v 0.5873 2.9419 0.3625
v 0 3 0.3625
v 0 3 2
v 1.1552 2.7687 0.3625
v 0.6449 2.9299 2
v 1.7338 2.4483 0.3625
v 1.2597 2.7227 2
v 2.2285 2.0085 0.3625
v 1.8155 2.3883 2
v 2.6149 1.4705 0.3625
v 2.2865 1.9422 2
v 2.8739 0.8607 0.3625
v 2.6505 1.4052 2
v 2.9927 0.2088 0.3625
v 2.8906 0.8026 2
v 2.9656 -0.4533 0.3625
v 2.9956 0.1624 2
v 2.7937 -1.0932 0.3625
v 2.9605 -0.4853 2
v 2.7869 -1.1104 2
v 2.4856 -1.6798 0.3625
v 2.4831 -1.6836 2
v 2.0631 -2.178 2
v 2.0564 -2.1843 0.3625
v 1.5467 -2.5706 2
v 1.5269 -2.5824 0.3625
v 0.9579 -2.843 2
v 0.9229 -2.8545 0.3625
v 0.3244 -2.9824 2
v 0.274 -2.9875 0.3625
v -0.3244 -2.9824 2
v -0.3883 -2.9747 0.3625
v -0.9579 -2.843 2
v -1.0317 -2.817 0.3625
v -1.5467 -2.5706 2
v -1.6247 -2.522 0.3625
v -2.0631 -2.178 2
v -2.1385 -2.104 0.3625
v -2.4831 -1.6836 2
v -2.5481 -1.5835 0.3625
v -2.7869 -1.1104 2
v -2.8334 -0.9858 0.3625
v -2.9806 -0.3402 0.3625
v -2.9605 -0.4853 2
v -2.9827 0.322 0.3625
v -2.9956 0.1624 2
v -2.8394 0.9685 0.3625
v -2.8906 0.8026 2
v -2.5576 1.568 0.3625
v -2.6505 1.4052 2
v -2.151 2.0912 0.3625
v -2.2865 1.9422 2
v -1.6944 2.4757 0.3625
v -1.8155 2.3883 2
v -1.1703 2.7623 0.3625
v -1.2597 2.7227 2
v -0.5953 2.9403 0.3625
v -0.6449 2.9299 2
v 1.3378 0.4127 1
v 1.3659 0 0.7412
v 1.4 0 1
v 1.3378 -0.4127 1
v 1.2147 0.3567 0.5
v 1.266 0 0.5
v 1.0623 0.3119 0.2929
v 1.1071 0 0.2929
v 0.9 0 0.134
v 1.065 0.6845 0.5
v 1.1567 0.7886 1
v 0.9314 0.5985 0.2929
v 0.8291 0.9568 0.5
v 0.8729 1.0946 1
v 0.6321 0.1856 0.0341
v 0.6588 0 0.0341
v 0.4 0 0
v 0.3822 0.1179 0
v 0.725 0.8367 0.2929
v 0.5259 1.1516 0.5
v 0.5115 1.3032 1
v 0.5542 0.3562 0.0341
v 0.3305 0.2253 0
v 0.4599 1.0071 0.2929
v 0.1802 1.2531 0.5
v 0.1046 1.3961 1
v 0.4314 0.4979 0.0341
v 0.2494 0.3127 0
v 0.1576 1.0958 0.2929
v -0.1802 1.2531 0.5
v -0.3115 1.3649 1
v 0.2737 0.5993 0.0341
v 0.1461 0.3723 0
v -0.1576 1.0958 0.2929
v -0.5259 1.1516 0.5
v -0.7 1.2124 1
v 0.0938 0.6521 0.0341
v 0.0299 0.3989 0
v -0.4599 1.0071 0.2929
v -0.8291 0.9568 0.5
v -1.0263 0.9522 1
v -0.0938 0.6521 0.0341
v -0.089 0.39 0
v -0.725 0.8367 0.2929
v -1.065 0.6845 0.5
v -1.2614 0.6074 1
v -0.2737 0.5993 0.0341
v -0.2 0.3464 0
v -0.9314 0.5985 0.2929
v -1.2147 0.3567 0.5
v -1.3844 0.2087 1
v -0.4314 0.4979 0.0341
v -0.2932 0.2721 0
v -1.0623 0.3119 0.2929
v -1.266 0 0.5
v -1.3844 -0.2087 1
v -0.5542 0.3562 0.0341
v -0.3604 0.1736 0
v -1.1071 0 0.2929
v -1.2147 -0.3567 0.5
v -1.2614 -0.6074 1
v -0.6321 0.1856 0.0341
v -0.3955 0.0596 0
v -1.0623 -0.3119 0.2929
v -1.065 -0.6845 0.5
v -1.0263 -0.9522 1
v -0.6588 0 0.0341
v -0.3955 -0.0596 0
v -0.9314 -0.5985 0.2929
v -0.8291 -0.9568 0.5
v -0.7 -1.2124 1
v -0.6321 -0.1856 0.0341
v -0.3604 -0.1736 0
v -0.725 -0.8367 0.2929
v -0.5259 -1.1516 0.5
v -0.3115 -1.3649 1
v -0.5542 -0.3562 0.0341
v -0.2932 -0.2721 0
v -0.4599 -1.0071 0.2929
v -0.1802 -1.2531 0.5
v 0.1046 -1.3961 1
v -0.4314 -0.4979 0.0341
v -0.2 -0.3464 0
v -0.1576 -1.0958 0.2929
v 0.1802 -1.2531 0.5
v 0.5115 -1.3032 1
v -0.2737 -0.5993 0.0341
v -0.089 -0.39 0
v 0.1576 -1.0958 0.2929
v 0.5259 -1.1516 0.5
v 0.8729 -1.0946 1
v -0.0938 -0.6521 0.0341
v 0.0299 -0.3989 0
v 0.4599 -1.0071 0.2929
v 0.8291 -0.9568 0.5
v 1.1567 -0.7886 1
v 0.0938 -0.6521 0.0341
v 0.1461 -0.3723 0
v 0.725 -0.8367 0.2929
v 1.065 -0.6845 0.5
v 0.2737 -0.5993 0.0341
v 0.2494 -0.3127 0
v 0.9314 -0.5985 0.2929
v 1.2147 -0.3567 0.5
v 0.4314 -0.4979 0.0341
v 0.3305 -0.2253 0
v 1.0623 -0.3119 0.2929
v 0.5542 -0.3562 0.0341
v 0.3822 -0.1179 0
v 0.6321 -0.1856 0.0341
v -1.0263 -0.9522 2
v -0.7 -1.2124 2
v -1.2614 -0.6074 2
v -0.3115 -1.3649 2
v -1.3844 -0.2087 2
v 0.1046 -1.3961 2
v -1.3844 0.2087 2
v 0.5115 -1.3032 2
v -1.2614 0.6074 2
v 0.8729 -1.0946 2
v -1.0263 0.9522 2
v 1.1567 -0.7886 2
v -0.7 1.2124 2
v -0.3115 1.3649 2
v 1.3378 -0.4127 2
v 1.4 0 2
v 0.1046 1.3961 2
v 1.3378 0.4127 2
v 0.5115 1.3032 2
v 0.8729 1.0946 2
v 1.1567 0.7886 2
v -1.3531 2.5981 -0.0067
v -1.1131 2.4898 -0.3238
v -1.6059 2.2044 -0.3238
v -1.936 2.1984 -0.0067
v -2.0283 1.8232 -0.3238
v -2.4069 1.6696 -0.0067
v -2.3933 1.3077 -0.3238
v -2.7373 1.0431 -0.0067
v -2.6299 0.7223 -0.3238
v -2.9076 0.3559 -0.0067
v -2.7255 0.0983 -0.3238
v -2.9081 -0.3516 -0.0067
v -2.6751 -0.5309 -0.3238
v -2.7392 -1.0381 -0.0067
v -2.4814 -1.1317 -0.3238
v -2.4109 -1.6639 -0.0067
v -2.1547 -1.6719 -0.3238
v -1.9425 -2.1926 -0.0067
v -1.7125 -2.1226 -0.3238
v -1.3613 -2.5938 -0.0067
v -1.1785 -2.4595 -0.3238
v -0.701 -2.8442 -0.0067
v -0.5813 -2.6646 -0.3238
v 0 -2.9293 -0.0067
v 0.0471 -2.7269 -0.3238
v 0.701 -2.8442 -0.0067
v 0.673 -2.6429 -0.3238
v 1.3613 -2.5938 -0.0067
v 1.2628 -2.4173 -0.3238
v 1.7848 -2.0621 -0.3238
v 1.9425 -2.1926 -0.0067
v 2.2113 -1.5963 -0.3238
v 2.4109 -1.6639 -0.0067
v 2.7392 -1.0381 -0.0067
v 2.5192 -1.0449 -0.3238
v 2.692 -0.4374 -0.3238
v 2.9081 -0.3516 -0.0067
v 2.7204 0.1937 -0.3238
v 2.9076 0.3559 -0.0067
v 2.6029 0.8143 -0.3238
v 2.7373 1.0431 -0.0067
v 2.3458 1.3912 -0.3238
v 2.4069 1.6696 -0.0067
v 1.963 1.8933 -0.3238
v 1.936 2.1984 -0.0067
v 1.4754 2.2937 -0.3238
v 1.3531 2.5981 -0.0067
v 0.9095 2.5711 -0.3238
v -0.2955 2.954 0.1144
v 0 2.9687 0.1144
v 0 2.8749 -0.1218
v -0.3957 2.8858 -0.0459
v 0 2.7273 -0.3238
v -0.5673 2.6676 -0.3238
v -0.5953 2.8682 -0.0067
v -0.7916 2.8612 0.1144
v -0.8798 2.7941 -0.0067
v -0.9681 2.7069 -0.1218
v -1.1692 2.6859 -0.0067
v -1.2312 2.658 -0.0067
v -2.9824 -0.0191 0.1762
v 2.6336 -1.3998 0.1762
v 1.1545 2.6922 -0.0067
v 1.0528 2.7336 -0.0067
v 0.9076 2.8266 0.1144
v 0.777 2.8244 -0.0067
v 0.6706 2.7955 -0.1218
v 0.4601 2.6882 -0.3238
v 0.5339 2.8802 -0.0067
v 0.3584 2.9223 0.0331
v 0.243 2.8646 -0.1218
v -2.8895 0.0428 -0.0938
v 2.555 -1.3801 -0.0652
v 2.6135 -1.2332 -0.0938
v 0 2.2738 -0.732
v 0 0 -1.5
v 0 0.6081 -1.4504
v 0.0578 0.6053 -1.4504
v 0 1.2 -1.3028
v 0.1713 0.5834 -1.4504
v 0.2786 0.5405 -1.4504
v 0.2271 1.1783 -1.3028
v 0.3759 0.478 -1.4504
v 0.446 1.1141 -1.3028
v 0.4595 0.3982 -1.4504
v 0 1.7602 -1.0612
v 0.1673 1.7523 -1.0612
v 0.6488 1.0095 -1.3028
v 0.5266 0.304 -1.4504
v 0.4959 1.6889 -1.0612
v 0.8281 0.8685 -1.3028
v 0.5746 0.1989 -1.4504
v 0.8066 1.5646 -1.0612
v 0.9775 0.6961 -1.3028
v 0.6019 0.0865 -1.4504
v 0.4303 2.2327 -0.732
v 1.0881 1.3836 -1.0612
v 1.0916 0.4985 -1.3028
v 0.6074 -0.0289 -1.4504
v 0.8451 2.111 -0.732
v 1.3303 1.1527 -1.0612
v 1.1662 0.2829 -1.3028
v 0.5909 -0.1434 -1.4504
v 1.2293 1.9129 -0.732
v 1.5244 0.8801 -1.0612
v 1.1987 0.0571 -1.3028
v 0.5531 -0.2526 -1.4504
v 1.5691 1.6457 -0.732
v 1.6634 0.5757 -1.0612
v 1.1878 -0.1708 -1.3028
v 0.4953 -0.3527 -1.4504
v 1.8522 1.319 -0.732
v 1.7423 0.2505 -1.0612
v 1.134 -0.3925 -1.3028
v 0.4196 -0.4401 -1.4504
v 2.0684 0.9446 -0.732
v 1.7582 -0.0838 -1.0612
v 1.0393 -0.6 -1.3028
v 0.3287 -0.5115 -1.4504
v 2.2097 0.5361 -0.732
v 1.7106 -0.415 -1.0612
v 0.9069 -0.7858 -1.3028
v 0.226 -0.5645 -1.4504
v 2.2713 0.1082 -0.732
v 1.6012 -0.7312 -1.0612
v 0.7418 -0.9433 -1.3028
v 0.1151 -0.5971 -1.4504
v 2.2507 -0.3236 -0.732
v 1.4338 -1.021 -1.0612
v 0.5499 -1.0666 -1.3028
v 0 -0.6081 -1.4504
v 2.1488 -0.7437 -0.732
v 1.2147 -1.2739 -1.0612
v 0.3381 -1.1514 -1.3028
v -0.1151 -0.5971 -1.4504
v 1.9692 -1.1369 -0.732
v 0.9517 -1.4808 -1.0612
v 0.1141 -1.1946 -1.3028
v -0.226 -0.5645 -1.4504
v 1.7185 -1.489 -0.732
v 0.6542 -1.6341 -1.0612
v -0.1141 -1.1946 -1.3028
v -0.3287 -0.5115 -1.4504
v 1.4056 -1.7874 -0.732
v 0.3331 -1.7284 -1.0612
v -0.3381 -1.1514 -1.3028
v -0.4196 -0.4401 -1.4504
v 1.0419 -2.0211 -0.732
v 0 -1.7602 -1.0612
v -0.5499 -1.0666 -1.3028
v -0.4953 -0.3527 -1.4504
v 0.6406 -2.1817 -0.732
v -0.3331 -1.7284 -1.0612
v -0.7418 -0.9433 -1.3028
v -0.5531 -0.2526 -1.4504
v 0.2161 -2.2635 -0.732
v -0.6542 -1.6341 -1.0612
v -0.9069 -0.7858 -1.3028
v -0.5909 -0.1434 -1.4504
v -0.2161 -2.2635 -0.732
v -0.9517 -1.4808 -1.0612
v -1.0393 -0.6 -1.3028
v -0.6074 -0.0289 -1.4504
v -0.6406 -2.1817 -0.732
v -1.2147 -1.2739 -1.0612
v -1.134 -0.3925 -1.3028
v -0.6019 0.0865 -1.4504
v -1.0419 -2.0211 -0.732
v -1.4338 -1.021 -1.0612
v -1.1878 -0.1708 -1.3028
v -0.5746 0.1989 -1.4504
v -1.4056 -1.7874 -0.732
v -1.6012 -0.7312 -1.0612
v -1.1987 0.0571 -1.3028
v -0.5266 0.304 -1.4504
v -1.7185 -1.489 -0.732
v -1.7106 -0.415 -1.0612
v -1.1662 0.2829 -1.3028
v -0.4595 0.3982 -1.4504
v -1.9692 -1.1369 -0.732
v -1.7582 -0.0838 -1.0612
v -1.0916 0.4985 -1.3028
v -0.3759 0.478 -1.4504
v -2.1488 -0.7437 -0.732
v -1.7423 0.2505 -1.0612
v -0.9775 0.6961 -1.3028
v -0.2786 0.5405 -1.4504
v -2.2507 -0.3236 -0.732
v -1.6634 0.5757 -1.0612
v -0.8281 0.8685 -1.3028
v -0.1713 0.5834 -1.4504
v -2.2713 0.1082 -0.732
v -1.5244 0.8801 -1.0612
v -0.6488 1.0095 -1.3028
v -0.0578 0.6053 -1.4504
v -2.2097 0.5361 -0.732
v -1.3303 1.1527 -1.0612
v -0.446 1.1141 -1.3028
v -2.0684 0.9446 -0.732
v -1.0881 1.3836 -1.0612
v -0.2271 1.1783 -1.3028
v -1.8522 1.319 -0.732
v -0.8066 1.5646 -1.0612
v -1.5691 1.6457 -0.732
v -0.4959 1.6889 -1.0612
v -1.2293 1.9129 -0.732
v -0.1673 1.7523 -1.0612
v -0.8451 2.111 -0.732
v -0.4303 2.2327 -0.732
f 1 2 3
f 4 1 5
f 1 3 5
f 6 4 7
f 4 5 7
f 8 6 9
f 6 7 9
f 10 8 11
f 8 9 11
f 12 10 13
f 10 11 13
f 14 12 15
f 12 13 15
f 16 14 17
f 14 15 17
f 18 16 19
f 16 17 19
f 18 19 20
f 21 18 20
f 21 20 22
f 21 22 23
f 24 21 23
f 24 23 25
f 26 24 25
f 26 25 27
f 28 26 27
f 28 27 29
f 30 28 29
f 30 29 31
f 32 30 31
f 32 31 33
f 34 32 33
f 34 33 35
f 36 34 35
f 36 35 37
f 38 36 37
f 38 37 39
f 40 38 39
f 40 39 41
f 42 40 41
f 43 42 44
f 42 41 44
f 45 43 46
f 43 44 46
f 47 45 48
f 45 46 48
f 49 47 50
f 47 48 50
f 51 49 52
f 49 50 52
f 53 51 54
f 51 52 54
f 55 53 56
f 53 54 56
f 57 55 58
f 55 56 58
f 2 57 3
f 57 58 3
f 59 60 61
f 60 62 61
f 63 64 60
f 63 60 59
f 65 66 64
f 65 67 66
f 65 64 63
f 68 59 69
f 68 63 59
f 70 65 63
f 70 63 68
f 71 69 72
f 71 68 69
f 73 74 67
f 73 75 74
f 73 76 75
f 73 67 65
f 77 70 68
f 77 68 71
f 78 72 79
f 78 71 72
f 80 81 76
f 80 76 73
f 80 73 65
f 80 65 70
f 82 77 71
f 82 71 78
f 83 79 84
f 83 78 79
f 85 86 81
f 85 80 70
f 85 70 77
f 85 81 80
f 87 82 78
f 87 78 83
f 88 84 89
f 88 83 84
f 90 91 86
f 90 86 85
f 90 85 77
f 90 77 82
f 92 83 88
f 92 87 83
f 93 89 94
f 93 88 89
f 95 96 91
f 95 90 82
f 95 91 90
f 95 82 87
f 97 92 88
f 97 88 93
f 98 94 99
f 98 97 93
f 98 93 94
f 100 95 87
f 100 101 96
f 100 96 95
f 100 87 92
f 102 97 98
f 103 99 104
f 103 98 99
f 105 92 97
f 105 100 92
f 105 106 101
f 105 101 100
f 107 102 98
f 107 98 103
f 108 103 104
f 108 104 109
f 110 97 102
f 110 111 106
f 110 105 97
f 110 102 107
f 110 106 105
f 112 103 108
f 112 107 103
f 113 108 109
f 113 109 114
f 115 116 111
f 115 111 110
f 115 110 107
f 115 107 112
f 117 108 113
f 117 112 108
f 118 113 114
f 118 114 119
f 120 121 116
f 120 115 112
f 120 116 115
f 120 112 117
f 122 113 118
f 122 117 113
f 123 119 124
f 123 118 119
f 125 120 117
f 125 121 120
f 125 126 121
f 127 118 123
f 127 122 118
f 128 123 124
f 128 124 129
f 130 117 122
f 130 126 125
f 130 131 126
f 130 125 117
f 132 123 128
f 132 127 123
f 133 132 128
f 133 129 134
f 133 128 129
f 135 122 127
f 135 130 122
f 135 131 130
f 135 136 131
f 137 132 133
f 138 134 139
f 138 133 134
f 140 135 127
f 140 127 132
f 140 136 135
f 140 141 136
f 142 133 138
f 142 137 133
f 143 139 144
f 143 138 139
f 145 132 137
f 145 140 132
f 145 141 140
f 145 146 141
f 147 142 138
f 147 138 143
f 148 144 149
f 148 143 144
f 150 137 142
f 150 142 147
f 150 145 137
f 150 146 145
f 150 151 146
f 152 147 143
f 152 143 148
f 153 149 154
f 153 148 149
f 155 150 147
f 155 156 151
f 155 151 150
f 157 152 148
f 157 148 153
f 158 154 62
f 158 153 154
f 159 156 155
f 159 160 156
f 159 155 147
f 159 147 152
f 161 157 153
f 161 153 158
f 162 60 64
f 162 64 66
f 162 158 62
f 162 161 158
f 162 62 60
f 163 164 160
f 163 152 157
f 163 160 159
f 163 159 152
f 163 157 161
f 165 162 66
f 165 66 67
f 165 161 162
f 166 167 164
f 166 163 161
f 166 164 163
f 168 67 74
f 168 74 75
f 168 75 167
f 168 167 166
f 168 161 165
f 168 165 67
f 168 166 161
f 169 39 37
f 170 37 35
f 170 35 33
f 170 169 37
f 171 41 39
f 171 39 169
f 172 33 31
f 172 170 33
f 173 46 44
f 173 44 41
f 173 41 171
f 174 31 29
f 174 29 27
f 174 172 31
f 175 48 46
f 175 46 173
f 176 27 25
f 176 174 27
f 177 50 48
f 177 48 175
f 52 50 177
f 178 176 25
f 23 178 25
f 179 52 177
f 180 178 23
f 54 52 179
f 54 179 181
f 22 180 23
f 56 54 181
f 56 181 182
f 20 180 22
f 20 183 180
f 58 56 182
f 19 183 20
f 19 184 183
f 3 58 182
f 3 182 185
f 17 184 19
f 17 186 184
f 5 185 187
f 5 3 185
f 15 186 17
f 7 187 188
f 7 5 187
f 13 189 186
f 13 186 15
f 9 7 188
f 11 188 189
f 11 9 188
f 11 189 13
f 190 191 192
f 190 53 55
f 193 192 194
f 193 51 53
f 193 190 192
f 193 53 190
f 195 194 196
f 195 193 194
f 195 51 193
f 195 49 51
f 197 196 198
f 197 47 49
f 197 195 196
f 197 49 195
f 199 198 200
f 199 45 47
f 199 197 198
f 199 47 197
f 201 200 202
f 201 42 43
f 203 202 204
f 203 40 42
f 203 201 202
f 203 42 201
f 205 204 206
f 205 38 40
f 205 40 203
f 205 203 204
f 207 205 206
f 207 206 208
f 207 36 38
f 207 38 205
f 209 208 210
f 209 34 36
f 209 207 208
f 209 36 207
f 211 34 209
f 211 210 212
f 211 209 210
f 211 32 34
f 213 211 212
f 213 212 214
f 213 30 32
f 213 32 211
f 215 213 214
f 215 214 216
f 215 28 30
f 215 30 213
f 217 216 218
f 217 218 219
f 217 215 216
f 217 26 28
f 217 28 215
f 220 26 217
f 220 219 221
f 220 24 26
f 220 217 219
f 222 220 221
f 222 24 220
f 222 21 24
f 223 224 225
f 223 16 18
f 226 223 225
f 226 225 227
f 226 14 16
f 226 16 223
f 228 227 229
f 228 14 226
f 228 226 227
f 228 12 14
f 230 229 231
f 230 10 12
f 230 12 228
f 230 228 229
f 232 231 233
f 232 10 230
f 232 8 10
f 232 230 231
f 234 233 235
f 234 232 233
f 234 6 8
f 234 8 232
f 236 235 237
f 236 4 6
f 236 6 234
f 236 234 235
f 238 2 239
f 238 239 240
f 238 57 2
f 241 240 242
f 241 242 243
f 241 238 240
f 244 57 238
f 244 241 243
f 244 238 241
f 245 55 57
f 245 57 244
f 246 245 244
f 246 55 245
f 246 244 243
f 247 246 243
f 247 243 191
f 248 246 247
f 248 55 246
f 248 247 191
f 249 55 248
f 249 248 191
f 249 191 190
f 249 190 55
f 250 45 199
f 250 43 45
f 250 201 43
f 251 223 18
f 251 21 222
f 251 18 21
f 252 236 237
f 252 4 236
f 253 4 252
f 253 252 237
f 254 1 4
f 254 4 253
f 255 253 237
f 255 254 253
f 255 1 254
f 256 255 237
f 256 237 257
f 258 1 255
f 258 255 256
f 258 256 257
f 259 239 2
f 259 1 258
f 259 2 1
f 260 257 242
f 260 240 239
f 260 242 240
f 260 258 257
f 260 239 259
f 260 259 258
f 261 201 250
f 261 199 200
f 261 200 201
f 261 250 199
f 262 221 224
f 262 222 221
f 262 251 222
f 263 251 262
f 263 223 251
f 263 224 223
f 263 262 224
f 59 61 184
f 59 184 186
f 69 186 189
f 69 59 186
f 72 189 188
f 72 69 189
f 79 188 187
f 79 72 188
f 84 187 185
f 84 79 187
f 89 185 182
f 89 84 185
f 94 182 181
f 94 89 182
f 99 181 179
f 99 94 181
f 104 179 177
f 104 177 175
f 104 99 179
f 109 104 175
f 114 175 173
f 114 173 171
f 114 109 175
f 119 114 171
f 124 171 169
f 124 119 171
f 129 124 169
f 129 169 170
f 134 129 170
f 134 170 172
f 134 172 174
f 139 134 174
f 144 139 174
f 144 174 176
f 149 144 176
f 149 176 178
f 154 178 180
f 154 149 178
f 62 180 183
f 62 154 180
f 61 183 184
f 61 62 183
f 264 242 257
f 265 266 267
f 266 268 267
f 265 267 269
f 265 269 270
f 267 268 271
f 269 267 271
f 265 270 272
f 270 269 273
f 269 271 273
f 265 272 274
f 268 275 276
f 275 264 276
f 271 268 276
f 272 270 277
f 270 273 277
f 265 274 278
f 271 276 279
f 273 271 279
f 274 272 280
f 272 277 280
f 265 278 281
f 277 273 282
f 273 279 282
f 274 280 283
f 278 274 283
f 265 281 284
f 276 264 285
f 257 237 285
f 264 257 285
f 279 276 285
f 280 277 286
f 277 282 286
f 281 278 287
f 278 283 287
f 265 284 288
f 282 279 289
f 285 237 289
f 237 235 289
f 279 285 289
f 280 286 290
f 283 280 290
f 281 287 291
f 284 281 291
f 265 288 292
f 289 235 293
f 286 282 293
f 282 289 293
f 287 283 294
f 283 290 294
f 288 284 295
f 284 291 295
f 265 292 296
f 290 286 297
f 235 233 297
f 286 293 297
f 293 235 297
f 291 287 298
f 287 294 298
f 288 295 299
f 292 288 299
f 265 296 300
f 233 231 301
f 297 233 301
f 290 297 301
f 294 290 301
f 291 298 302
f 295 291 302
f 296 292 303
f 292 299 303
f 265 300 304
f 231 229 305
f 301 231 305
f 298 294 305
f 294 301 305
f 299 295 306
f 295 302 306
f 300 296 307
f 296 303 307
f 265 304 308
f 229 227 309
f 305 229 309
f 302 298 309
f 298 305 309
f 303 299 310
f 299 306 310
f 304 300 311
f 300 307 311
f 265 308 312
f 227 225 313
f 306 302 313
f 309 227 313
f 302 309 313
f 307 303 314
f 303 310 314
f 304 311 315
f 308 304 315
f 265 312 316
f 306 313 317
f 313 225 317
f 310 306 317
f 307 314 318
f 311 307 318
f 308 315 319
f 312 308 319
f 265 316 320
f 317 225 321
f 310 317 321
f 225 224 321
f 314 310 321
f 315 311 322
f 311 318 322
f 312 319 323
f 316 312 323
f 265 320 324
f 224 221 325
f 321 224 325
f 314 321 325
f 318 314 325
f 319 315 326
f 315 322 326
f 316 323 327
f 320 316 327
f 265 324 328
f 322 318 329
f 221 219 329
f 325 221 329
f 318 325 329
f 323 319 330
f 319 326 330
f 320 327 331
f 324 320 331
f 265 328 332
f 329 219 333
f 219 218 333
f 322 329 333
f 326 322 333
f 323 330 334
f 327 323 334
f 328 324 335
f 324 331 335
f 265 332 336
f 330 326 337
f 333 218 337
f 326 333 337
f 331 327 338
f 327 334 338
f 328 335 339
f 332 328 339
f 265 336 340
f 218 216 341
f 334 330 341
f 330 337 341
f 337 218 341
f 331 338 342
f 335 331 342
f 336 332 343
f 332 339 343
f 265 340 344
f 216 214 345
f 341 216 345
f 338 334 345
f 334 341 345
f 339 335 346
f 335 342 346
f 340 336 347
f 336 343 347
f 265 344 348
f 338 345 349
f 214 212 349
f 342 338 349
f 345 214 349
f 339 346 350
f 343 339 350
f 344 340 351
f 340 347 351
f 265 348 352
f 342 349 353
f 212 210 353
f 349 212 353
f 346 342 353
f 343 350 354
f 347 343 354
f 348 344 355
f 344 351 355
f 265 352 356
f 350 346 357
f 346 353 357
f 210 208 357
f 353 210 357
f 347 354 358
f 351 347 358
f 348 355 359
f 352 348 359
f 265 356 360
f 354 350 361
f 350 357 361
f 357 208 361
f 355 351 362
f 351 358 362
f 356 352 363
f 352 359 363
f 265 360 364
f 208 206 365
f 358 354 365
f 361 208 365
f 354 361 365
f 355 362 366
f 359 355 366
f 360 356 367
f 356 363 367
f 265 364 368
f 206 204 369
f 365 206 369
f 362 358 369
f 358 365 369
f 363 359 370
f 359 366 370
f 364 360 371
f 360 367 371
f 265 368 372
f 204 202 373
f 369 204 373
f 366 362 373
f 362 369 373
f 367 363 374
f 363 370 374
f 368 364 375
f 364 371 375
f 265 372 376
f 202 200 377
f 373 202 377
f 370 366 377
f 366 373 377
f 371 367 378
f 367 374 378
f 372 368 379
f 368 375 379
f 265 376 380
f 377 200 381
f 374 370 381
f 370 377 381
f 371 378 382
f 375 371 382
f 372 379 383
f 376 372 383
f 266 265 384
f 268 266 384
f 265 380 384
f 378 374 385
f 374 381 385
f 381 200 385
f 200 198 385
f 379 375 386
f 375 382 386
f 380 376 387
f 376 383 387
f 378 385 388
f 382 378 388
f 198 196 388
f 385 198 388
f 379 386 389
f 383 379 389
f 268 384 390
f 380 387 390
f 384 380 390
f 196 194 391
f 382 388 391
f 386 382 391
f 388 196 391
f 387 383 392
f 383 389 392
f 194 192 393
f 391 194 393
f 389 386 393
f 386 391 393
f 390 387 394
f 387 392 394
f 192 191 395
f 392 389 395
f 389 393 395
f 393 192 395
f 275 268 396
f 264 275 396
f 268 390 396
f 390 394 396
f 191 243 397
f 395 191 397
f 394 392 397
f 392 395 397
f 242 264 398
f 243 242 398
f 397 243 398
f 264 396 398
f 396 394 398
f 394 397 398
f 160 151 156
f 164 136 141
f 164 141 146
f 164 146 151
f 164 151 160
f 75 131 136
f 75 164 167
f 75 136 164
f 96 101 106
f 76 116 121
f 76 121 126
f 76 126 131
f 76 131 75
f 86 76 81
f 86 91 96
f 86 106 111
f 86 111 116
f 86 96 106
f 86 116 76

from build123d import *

# Parameters (mm, degrees)
CROQUIS1_W              = 6
CROQUIS1_H              = 8
CROQUIS1_R              = 1.4
SALIENTE_EXTRUIR1_DEPTH = 2
SALIENTE_EXTRUIR2_DEPTH = 4
CROQUIS3_W              = 6
CROQUIS3_H              = 1
SALIENTE_EXTRUIR3_DEPTH = 4
REDONDEO1_R             = 1
REDONDEO2_R             = 1


with BuildPart() as part:
    # Croquis1 → Saliente-Extruir1 (new body)
    with BuildSketch(Plane.XY):
        Rectangle(CROQUIS1_W, CROQUIS1_H)
        Circle(CROQUIS1_R, mode=Mode.SUBTRACT)
    extrude(amount=SALIENTE_EXTRUIR1_DEPTH)

    # Croquis2 → Saliente-Extruir2 (add, symmetric)
    with BuildSketch(Plane(origin=(0, 0, 0), x_dir=(1, 0, 0), z_dir=(0, 1, 0))):
        with BuildLine():
            Line((-3, 0), (3, 0))
            ThreePointArc((3, 0), (0, 1.5), (-3, 0))
        make_face()
    extrude(amount=SALIENTE_EXTRUIR2_DEPTH, both=True)

    # Croquis3 → Saliente-Extruir3 (add)
    with BuildSketch(Plane.XY.offset(2)):
        with Locations((0, 3.5)):
            Rectangle(CROQUIS3_W, CROQUIS3_H)
        with Locations((0, -3.5)):
            Rectangle(CROQUIS3_W, CROQUIS3_H)
    extrude(amount=-SALIENTE_EXTRUIR3_DEPTH)

    # Redondeo1
    redondeo1_edges = [part.edges().sort_by_distance(p)[0] for p in [
        (-1.4, 0, 0),
    ]]
    fillet(redondeo1_edges, radius=REDONDEO1_R)

    # Croquis4 → Cortar-Revolución2 (revolve, cut)
    with BuildSketch(Plane(origin=(0, 0, 0), x_dir=(0, 0, -1), z_dir=(1, 0, 0))):
        with BuildLine():
            Line((0, 3), (-2, 3))
            Line((-2, 3), (-2, 10))
            Line((-2, 10), (3, 10))
            Line((3, 10), (3, 0))
            Line((3, 0), (1.5, 0))
            ThreePointArc((1.5, 0), (1.104101966, 1.677050983), (0, 3))
        make_face()
    revolve(axis=Axis((0, 0, 2), (0, 0, -1)), mode=Mode.SUBTRACT)

    # Redondeo2
    redondeo2_edges = [part.edges().sort_by_distance(p)[0] for p in [
        (0, -3, 0),
    ]]
    fillet(redondeo2_edges, radius=REDONDEO2_R)


solid = part.part
